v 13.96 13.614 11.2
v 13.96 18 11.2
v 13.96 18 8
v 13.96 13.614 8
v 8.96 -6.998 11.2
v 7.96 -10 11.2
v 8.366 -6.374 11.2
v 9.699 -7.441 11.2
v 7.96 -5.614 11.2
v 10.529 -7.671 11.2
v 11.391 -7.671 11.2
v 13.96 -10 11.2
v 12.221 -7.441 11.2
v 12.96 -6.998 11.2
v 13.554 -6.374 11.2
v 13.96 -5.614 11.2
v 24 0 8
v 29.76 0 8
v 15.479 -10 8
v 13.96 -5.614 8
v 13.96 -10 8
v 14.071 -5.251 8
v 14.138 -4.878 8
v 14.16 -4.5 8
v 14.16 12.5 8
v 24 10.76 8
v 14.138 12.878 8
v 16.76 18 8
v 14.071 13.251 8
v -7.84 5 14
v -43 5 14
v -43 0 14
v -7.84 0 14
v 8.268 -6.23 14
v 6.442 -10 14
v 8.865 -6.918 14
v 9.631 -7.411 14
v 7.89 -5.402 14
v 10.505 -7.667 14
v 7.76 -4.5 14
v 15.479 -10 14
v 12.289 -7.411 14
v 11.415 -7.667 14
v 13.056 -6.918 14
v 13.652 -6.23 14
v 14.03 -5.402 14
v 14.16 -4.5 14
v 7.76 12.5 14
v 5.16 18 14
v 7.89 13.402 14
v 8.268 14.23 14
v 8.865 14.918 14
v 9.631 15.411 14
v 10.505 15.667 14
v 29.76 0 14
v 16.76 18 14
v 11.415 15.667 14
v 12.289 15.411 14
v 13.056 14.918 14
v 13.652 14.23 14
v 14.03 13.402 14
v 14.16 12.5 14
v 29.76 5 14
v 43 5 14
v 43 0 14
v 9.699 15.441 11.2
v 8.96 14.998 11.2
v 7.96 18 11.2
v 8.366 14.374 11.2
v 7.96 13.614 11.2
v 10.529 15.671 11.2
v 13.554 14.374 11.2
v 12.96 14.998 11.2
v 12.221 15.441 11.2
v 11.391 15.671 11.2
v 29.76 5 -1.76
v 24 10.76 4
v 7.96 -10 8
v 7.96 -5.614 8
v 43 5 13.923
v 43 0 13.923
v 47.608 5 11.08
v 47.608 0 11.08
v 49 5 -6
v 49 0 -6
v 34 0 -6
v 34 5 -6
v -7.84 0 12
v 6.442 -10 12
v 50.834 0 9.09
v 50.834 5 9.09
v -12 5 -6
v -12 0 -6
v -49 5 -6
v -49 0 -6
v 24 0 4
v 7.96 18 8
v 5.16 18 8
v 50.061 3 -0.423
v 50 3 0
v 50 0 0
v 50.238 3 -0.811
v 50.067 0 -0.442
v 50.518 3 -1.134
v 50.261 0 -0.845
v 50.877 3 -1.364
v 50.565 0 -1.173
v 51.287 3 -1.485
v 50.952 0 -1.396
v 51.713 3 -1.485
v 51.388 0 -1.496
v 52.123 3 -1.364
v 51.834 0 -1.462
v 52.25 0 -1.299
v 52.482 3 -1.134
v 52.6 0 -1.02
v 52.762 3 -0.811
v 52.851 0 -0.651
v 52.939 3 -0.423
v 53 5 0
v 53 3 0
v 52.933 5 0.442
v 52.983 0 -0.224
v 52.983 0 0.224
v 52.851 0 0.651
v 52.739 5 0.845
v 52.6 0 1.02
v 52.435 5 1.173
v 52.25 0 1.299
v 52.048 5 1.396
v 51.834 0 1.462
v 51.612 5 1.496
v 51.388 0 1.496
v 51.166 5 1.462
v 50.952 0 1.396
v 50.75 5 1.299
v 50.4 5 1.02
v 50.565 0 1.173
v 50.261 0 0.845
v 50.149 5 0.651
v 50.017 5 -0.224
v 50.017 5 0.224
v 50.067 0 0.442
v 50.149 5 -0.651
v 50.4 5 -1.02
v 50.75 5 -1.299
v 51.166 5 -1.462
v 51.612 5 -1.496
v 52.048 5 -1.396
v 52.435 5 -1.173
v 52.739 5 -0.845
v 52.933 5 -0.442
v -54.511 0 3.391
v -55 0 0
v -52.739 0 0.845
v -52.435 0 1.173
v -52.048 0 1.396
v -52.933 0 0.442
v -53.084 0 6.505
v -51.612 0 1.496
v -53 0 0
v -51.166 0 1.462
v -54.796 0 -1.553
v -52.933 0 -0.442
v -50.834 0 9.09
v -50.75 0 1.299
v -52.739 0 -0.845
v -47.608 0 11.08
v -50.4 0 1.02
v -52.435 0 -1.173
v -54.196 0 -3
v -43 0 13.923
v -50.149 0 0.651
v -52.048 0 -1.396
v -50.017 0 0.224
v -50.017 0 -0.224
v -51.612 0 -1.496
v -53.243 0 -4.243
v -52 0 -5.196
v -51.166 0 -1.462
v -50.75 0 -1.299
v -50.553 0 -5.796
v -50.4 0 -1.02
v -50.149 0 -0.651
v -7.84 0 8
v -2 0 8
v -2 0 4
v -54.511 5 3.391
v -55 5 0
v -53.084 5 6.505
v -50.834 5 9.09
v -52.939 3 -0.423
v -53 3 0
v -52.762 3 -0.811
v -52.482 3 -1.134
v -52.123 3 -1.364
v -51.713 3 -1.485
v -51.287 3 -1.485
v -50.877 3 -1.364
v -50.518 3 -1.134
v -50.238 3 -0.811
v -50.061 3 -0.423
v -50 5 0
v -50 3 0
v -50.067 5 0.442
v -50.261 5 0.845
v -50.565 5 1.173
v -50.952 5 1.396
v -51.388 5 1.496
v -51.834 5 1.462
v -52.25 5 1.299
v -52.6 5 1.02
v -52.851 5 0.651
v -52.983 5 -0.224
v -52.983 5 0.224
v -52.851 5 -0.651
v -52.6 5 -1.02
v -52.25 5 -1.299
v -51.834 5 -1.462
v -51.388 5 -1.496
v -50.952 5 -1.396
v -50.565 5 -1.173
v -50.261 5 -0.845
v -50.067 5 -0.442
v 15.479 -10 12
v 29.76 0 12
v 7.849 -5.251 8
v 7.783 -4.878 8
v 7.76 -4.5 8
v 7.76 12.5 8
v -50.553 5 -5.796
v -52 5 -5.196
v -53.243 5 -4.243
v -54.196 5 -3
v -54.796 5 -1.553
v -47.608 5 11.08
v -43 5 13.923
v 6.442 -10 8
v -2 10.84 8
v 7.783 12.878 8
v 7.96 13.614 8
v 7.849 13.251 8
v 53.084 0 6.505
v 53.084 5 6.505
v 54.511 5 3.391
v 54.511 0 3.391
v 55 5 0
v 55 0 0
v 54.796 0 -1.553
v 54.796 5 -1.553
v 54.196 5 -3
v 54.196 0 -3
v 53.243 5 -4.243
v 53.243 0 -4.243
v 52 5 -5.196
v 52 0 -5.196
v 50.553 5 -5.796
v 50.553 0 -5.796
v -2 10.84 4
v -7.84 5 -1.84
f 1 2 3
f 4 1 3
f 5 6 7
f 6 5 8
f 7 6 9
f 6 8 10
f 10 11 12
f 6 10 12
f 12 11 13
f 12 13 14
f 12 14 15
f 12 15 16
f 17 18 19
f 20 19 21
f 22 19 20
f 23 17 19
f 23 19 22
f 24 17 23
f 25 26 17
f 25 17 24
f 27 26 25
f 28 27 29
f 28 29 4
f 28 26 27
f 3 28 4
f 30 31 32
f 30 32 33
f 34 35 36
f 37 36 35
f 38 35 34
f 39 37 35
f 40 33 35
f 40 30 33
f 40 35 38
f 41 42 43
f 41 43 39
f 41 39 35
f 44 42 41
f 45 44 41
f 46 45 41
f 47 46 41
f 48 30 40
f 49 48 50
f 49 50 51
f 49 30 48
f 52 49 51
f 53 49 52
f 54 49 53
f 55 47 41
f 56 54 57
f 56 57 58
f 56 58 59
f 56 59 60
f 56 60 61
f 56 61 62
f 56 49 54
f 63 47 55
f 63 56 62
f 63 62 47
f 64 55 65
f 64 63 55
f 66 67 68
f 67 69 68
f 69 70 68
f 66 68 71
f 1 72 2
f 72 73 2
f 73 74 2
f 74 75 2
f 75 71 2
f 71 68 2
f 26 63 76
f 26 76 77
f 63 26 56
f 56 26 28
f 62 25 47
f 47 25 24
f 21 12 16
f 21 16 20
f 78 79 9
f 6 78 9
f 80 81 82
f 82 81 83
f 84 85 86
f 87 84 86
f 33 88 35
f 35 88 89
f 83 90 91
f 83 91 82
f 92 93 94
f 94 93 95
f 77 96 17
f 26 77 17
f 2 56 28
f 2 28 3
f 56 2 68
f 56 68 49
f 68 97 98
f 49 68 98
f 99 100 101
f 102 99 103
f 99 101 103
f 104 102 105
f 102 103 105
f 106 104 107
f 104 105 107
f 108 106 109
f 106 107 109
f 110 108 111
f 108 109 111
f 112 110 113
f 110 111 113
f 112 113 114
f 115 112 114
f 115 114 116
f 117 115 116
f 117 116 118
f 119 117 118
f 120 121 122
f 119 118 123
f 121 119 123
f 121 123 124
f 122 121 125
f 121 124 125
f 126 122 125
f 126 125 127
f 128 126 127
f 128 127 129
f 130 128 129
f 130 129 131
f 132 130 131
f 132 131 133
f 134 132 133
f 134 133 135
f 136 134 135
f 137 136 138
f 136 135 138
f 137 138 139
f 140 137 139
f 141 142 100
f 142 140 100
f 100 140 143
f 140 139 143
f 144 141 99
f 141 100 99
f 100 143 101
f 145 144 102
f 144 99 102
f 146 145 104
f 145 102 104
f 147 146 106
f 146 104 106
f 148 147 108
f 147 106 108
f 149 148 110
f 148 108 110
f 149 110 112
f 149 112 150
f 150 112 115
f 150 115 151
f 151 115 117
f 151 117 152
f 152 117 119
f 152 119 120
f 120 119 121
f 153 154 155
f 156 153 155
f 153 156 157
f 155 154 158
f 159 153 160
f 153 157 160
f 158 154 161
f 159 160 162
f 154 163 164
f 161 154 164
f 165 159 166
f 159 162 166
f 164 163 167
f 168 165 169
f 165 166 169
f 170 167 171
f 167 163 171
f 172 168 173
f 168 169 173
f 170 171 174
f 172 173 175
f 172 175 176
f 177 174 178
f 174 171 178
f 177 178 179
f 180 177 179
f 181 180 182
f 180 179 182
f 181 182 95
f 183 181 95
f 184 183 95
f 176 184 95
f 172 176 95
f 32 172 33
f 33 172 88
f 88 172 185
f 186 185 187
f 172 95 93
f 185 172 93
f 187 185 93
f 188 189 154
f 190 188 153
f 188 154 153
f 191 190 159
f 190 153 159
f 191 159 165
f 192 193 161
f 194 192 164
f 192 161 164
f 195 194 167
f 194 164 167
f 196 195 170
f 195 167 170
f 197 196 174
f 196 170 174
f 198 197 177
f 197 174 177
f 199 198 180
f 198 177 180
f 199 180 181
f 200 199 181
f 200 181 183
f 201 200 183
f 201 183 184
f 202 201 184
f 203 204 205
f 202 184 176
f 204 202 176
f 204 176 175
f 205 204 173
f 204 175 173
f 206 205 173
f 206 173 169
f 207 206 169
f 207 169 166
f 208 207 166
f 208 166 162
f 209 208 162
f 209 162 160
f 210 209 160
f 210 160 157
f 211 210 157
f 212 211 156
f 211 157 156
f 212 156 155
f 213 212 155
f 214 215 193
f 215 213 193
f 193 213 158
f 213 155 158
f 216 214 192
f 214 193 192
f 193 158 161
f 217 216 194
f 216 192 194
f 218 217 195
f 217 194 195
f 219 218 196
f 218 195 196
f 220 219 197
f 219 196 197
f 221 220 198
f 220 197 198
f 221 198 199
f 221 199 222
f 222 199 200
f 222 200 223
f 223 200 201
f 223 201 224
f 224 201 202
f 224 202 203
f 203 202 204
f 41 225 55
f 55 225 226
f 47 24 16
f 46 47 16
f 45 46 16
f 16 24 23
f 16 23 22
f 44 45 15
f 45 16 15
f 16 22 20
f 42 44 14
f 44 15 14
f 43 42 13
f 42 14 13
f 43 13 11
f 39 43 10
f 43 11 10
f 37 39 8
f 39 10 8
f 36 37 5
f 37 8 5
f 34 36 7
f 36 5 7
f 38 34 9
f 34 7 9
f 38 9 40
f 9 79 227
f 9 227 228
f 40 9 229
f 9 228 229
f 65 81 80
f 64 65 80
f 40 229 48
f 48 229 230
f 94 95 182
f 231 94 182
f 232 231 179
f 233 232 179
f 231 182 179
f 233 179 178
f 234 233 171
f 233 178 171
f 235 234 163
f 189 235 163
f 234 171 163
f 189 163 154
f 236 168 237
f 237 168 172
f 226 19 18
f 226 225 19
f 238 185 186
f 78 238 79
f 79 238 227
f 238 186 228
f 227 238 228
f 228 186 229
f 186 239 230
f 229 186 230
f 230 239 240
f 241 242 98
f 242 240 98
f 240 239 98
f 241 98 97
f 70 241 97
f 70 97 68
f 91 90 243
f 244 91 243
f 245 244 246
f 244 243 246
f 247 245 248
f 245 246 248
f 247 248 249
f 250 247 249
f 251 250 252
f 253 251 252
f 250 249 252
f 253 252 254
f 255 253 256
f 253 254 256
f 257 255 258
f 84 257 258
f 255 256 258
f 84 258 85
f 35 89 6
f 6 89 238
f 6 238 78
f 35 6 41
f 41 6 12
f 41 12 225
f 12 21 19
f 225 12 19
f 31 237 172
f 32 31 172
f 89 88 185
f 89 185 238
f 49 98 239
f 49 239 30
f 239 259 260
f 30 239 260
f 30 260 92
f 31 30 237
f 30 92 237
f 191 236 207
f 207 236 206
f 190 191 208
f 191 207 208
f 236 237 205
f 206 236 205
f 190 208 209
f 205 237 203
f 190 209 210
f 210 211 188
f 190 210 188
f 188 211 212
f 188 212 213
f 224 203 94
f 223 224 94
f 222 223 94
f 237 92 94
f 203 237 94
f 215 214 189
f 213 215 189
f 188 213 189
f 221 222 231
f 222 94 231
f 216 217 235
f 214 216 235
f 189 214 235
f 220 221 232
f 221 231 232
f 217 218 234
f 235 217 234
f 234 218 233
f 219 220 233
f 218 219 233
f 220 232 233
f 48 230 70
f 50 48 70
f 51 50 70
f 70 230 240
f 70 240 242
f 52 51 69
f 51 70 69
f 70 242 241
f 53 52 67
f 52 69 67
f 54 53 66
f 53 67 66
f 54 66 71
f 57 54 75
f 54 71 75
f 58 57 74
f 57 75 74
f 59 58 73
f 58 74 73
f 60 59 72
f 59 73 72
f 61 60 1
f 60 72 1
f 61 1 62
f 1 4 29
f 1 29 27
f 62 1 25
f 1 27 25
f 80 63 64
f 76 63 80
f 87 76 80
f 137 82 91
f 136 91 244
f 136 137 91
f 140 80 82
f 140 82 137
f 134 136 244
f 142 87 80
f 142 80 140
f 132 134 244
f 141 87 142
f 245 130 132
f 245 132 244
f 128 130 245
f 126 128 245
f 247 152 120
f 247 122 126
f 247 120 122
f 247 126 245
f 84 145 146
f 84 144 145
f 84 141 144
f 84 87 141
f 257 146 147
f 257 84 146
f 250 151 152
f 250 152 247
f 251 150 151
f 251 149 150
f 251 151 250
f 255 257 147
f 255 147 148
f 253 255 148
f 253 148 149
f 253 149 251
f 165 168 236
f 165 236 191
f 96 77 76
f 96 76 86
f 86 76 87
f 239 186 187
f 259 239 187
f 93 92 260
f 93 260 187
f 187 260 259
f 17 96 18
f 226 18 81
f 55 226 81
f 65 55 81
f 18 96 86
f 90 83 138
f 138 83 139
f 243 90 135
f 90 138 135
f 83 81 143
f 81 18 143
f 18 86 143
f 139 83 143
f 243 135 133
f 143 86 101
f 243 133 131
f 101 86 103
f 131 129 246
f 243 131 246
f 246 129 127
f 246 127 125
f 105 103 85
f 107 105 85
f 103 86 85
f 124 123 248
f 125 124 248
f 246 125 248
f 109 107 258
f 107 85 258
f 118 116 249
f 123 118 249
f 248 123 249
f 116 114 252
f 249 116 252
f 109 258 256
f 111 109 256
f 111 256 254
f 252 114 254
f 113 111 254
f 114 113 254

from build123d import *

# Parameters (mm, degrees)
BOSS_EXTRUDE1_DEPTH = 3
CUT_EXTRUDE1_DEPTH  = 10
CUT_EXTRUDE3_START  = 8
SKETCH8_W           = 6
SKETCH8_H           = 3
CUT_EXTRUDE3_DEPTH  = 6
BOSS_EXTRUDE4_START = 18
BOSS_EXTRUDE4_DEPTH = 28
BOSS_EXTRUDE5_DEPTH = 3
CUT_EXTRUDE4_DEPTH  = 3
CUT_EXTRUDE5_DEPTH  = 10
SKETCH18_R          = 1.5
BOSS_EXTRUDE9_DEPTH = 2
CHAMFER1_SIZE       = 15
CHAMFER2_SIZE       = 15
CHAMFER2_SIZE_2     = 10.503113073
CUT_EXTRUDE6_DEPTH  = 5
BOSS_EXTRUDE8_DEPTH = 2
CHAMFER3_DEPTH      = 6
CHAMFER3_2_DEPTH    = 5


with BuildPart() as part:
    # Sketch1 → Boss-Extrude1 (new body)
    with BuildSketch(Plane(origin=(0, 0, 0), x_dir=(1, 0, 0), z_dir=(0, 1, 0))):
        with BuildLine():
            ThreePointArc((-49, -6), (-53.242640687, -4.242640687), (-55, 0))
            ThreePointArc((-55, 0), (-51.485281374, -8.485281374), (-43, -12))
            Line((-43, -12), (43, -12))
            ThreePointArc((43, -12), (51.485281374, -8.485281374), (55, 0))
            ThreePointArc((55, 0), (53.242640687, -4.242640687), (49, -6))
            Line((49, -6), (-49, -6))
        make_face()
        with BuildLine():
            Line((-53, 0), (-55, 0))
            ThreePointArc((-55, 0), (-53.242640687, -4.242640687), (-49, -6))
            Line((-49, -6), (49, -6))
            ThreePointArc((49, -6), (53.242640687, -4.242640687), (55, 0))
            Line((55, 0), (53, 0))
            ThreePointArc((53, 0), (51.5, -1.5), (50, 0))
            Line((50, 0), (-50, 0))
            ThreePointArc((-50, 0), (-51.5, -1.5), (-53, 0))
        make_face()
        with BuildLine():
            Line((49, 6), (-49, 6))
            ThreePointArc((-49, 6), (-53.242640687, 4.242640687), (-55, 0))
            Line((-55, 0), (-53, 0))
            ThreePointArc((-53, 0), (-51.5, 1.5), (-50, 0))
            Line((-50, 0), (50, 0))
            ThreePointArc((50, 0), (51.5, 1.5), (53, 0))
            Line((53, 0), (55, 0))
            ThreePointArc((55, 0), (53.242640687, 4.242640687), (49, 6))
        make_face()
    extrude(amount=BOSS_EXTRUDE1_DEPTH)

    # Sketch2 → Cut-Extrude1 (cut)
    with BuildSketch(Plane(origin=(0, 3, 0), x_dir=(1, 0, 0), z_dir=(0, 1, 0))):
        Polygon((22, -8), (36, 6), (-14, 6), (0, -8), align=None)
    extrude(amount=-CUT_EXTRUDE1_DEPTH, mode=Mode.SUBTRACT)

    # Sketch8 → Cut-Extrude3 (cut)
    with BuildSketch(Plane.XY.offset(CUT_EXTRUDE3_START)):
        with Locations((10.960071178, 1.5)):
            Rectangle(SKETCH8_W, SKETCH8_H)
    extrude(amount=CUT_EXTRUDE3_DEPTH, mode=Mode.SUBTRACT)


with BuildPart() as cut_extrude3_piece_1:
    # of the separate pieces the step leaves, piece 1, a body of its own (cut_extrude3_pieces)
    add(part.part.solids().sort_by_distance((-55, 0, 0))[0])

    # Sketch9 → Boss-Extrude4 (add)
    with BuildSketch(Plane(origin=(0, 0, 0), x_dir=(1, 0, 0), z_dir=(0, 1, 0)).offset(BOSS_EXTRUDE4_START)):
        Polygon((13.960071178, -11.2), (13.960071178, -8), (14.760071178, -8), (14.760071178, -12), (7.160071178, -12), (7.160071178, -8), (7.960071178, -8), (7.960071178, -11.2), align=None)
    extrude(amount=-BOSS_EXTRUDE4_DEPTH)


with BuildPart() as cut_extrude3_piece_2:
    # of the separate pieces the step leaves, piece 2, a body of its own (cut_extrude3_pieces)
    add(part.part.solids().sort_by_distance((13.960071178, 0, 12))[0])


with BuildPart() as cut_extrude3_piece_1_1:
    add(cut_extrude3_piece_1.part)

    # Combine1: union Cut-Extrude3 piece 2
    add(cut_extrude3_piece_2.part)

    # Sketch11 → Boss-Extrude5 (add)
    with BuildSketch(Plane(origin=(0, 3, 0), x_dir=(1, 0, 0), z_dir=(0, 1, 0))):
        Polygon((-14, 6), (-12, 6), (2, -8), (0, -8), align=None)
        Polygon((20, -8), (34, 6), (36, 6), (22, -8), align=None)
    extrude(amount=-BOSS_EXTRUDE5_DEPTH)

    # Sketch13 → Cut-Extrude4 (cut)
    with BuildSketch(Plane(origin=(0, 3, 0), x_dir=(1, 0, 0), z_dir=(0, 1, 0))):
        Polygon((2, -8), (-2, -8), (-2, -4), align=None)
        Polygon((24, -4), (24, -8), (20, -8), align=None)
    extrude(amount=-CUT_EXTRUDE4_DEPTH, mode=Mode.SUBTRACT)

    # Sketch15 → Cut-Extrude5 (cut)
    with BuildSketch(Plane.XY.offset(12)):
        with BuildLine():
            Line((14.160071178, 12.5), (14.160071178, -4.5))
            ThreePointArc((14.160071178, -4.5), (10.960071178, -7.7), (7.760071178, -4.5))
            Line((7.760071178, -4.5), (7.760071178, 12.5))
            ThreePointArc((7.760071178, 12.5), (10.960071178, 15.7), (14.160071178, 12.5))
        make_face()
    extrude(amount=-CUT_EXTRUDE5_DEPTH, mode=Mode.SUBTRACT)

    # Sketch18 → Boss-Extrude9 (add)
    # profile 1 of 2: a face of its own
    with BuildSketch(Plane(origin=(0, 3, 0), x_dir=(1, 0, 0), z_dir=(0, 1, 0))):
        with BuildLine():
            Line((7.160071178, -12), (7.160071178, -8))
            Line((7.160071178, -8), (-2, -8))
            Line((-2, -8), (-2, -4))
            Line((-2, -4), (-12, 6))
            Line((-12, 6), (-49, 6))
            ThreePointArc((-49, 6), (-53.242640687, 4.242640687), (-55, 0))
            ThreePointArc((-55, 0), (-51.485281374, -8.485281374), (-43, -12))
            Line((-43, -12), (7.160071178, -12))
        make_face()
        with Locations((-51.5, 0)):
            Circle(SKETCH18_R, mode=Mode.SUBTRACT)
    # profile 2 of 2: a face of its own
    with BuildSketch(Plane(origin=(0, 3, 0), x_dir=(1, 0, 0), z_dir=(0, 1, 0))):
        with BuildLine():
            Line((34, 6), (24, -4))
            Line((24, -4), (24, -8))
            Line((24, -8), (14.760071178, -8))
            Line((14.760071178, -8), (14.760071178, -12))
            Line((14.760071178, -12), (43, -12))
            ThreePointArc((43, -12), (51.485281374, -8.485281374), (55, 0))
            ThreePointArc((55, 0), (53.242640687, 4.242640687), (49, 6))
            Line((49, 6), (34, 6))
        make_face()
        with Locations((51.5, 0)):
            Circle(SKETCH18_R, mode=Mode.SUBTRACT)
    extrude(amount=BOSS_EXTRUDE9_DEPTH)

    # Chamfer1
    # the kernel refuses this chamfer: 15 mm, written as the material it adds along each edge
    with BuildSketch(Plane(origin=(14.760071178, 5, 8), x_dir=(0, 1, 0), z_dir=(0, 0, 1))) as chamfer1_piece_1_section:
        Polygon((CHAMFER1_SIZE, 0), (0, -CHAMFER1_SIZE), (0, 0), align=None)
    chamfer1_piece_1 = extrude(amount=4, mode=Mode.PRIVATE)
    chamfer1_piece_1 = split(chamfer1_piece_1, bisect_by=Plane(origin=(14.760071178, 18, 8), z_dir=(0, -1, 0)), keep=Keep.TOP, mode=Mode.PRIVATE)
    chamfer1_piece_1 = split(chamfer1_piece_1, bisect_by=Plane(origin=(17.380035589, 5, 10.619964411), z_dir=(-0.7071067811865474, 0, -0.7071067811865477)), keep=Keep.TOP, mode=Mode.PRIVATE)
    add(chamfer1_piece_1)
    with BuildSketch(Plane(origin=(14.760071178, 5, -30.575244819), x_dir=(0, 1, 0), z_dir=(0, 0, 1))) as chamfer1_piece_2_section:
        Polygon((CHAMFER1_SIZE, 0), (0, -CHAMFER1_SIZE), (0, 0), align=None)
    chamfer1_piece_2 = extrude(amount=42.575244819, mode=Mode.PRIVATE)
    chamfer1_piece_2 = split(chamfer1_piece_2, bisect_by=Plane(origin=(14.760071178, 5, 8), z_dir=(0, 0, -1)), keep=Keep.TOP, mode=Mode.PRIVATE)
    chamfer1_piece_2 = split(chamfer1_piece_2, bisect_by=Plane(origin=(36.667657999, 5, -8.667657999), z_dir=(0.7071067811865474, 0, 0.7071067811865477)), keep=Keep.TOP, mode=Mode.PRIVATE)
    chamfer1_piece_2 = split(chamfer1_piece_2, bisect_by=Plane(origin=(24, 5, -30.575244819), z_dir=(1, 0, 0)), keep=Keep.TOP, mode=Mode.PRIVATE)
    add(chamfer1_piece_2)
    with BuildSketch(Plane(origin=(14.760071178, 5, 8), x_dir=(0, 1, 0), z_dir=(0, 0, 1))) as chamfer1_piece_3_section:
        Polygon((CHAMFER1_SIZE, 0), (0, -CHAMFER1_SIZE), (0, 0), align=None)
    chamfer1_piece_3 = extrude(amount=4, mode=Mode.PRIVATE)
    chamfer1_piece_3 = split(chamfer1_piece_3, bisect_by=Plane(origin=(14.760071178, 18, 8), z_dir=(0, -1, 0)), keep=Keep.TOP, mode=Mode.PRIVATE)
    chamfer1_piece_3 = split(chamfer1_piece_3, bisect_by=Plane(origin=(17.380035589, 5, 10.619964411), z_dir=(0.7071067811865474, 0, 0.7071067811865477)), keep=Keep.TOP, mode=Mode.PRIVATE)
    chamfer1_piece_3 = split(chamfer1_piece_3, bisect_by=Plane(origin=(24, 5, 8), z_dir=(-1, 0, 0)), keep=Keep.TOP, mode=Mode.PRIVATE)
    add(chamfer1_piece_3)
    with BuildSketch(Plane(origin=(14.760071178, 5, 8), x_dir=(0, 1, 0), z_dir=(0, 0, 1))) as chamfer1_piece_4_section:
        Polygon((CHAMFER1_SIZE, 0), (0, -CHAMFER1_SIZE), (0, 0), align=None)
    chamfer1_piece_4 = extrude(amount=4, mode=Mode.PRIVATE)
    chamfer1_piece_4 = split(chamfer1_piece_4, bisect_by=Plane(origin=(24, 5, 8), z_dir=(1, 0, 0)), keep=Keep.TOP, mode=Mode.PRIVATE)
    add(chamfer1_piece_4)
    with BuildSketch(Plane(origin=(7.160071178, 5, 12), x_dir=(0, 1, 0), z_dir=(0, 0, -1))) as chamfer1_piece_5_section:
        Polygon((CHAMFER1_SIZE, 0), (0, -CHAMFER1_SIZE), (0, 0), align=None)
    chamfer1_piece_5 = extrude(amount=4, mode=Mode.PRIVATE)
    chamfer1_piece_5 = split(chamfer1_piece_5, bisect_by=Plane(origin=(6.580035589, 5, 12.580035589), z_dir=(-0.7071067811865489, 0, 0.7071067811865461)), keep=Keep.TOP, mode=Mode.PRIVATE)
    chamfer1_piece_5 = split(chamfer1_piece_5, bisect_by=Plane(origin=(-2, 5, 12), z_dir=(1, 0, 0)), keep=Keep.TOP, mode=Mode.PRIVATE)
    chamfer1_piece_5 = split(chamfer1_piece_5, bisect_by=Plane(origin=(7.160071178, 18, 12), z_dir=(0, -1, 0)), keep=Keep.TOP, mode=Mode.PRIVATE)
    add(chamfer1_piece_5)
    with BuildSketch(Plane(origin=(7.160071178, 5, 12), x_dir=(0, 1, 0), z_dir=(0, 0, -1))) as chamfer1_piece_6_section:
        Polygon((CHAMFER1_SIZE, 0), (0, -CHAMFER1_SIZE), (0, 0), align=None)
    chamfer1_piece_6 = extrude(amount=4, mode=Mode.PRIVATE)
    chamfer1_piece_6 = split(chamfer1_piece_6, bisect_by=Plane(origin=(-2, 5, 12), z_dir=(-1, 0, 0)), keep=Keep.TOP, mode=Mode.PRIVATE)
    add(chamfer1_piece_6)
    with BuildSketch(Plane(origin=(7.160071178, 5, 12), x_dir=(0, 1, 0), z_dir=(0, 0, -1))) as chamfer1_piece_7_section:
        Polygon((CHAMFER1_SIZE, 0), (0, -CHAMFER1_SIZE), (0, 0), align=None)
    chamfer1_piece_7 = extrude(amount=4, mode=Mode.PRIVATE)
    chamfer1_piece_7 = split(chamfer1_piece_7, bisect_by=Plane(origin=(6.580035589, 5, 12.580035589), z_dir=(0.7071067811865489, 0, -0.7071067811865461)), keep=Keep.TOP, mode=Mode.PRIVATE)
    chamfer1_piece_7 = split(chamfer1_piece_7, bisect_by=Plane(origin=(7.160071178, 18, 12), z_dir=(0, -1, 0)), keep=Keep.TOP, mode=Mode.PRIVATE)
    add(chamfer1_piece_7)
    with BuildSketch(Plane(origin=(7.160071178, 5, 12), x_dir=(0, 1, 0), z_dir=(0, 0, -1))) as chamfer1_piece_8_section:
        Polygon((CHAMFER1_SIZE, 0), (0, -CHAMFER1_SIZE), (0, 0), align=None)
    chamfer1_piece_8 = extrude(amount=42.575244819, mode=Mode.PRIVATE)
    chamfer1_piece_8 = split(chamfer1_piece_8, bisect_by=Plane(origin=(6.580035589, 5, 12.580035589), z_dir=(-0.7071067811865489, 0, 0.7071067811865461)), keep=Keep.TOP, mode=Mode.PRIVATE)
    chamfer1_piece_8 = split(chamfer1_piece_8, bisect_by=Plane(origin=(-2, 5, 12), z_dir=(-1, 0, 0)), keep=Keep.TOP, mode=Mode.PRIVATE)
    chamfer1_piece_8 = split(chamfer1_piece_8, bisect_by=Plane(origin=(7.160071178, 5, 8), z_dir=(0, 0, -1)), keep=Keep.TOP, mode=Mode.PRIVATE)
    add(chamfer1_piece_8)

    # Chamfer2
    # the kernel refuses this chamfer: 15, 10.503113073 mm, written as the material it adds along each edge
    with BuildSketch(Plane(origin=(7.160071178, 0, 12), x_dir=(-1, 0, 0), z_dir=(0, 0, -1))) as chamfer2_piece_1_section:
        Polygon((CHAMFER2_SIZE, 0), (0, -CHAMFER2_SIZE_2), (0, 0), align=None)
    chamfer2_piece_1 = extrude(amount=4, mode=Mode.PRIVATE)
    chamfer2_piece_1 = split(chamfer2_piece_1, bisect_by=Plane(origin=(-2, 0, 12), z_dir=(-1, 0, 0)), keep=Keep.TOP, mode=Mode.PRIVATE)
    add(chamfer2_piece_1)
    with BuildSketch(Plane(origin=(7.160071178, 0, 12), x_dir=(-1, 0, 0), z_dir=(0, 0, -1))) as chamfer2_piece_2_section:
        Polygon((CHAMFER2_SIZE, 0), (0, -CHAMFER2_SIZE_2), (0, 0), align=None)
    chamfer2_piece_2 = extrude(amount=4, mode=Mode.PRIVATE)
    chamfer2_piece_2 = split(chamfer2_piece_2, bisect_by=Plane(origin=(6.580035589, 0, 12.580035589), z_dir=(-0.7071067811865476, 0, 0.7071067811865476)), keep=Keep.TOP, mode=Mode.PRIVATE)
    chamfer2_piece_2 = split(chamfer2_piece_2, bisect_by=Plane(origin=(-2, 0, 12), z_dir=(1, 0, 0)), keep=Keep.TOP, mode=Mode.PRIVATE)
    add(chamfer2_piece_2)
    with BuildSketch(Plane(origin=(7.160071178, 0, 12), x_dir=(-1, 0, 0), z_dir=(0, 0, -1))) as chamfer2_piece_3_section:
        Polygon((CHAMFER2_SIZE, 0), (0, -CHAMFER2_SIZE_2), (0, 0), align=None)
    chamfer2_piece_3 = extrude(amount=42.738283454, mode=Mode.PRIVATE)
    chamfer2_piece_3 = split(chamfer2_piece_3, bisect_by=Plane(origin=(6.580035589, 0, 12.580035589), z_dir=(-0.7071067811865476, 0, 0.7071067811865476)), keep=Keep.TOP, mode=Mode.PRIVATE)
    chamfer2_piece_3 = split(chamfer2_piece_3, bisect_by=Plane(origin=(7.160071178, 0, 8), z_dir=(0, 0, -1)), keep=Keep.TOP, mode=Mode.PRIVATE)
    chamfer2_piece_3 = split(chamfer2_piece_3, bisect_by=Plane(origin=(-2, 0, 12), z_dir=(-1, 0, 0)), keep=Keep.TOP, mode=Mode.PRIVATE)
    add(chamfer2_piece_3)
    with BuildSketch(Plane(origin=(7.160071178, 0, 12), x_dir=(-1, 0, 0), z_dir=(0, 0, -1))) as chamfer2_piece_4_section:
        Polygon((CHAMFER2_SIZE, 0), (0, -CHAMFER2_SIZE_2), (0, 0), align=None)
    chamfer2_piece_4 = extrude(amount=4, mode=Mode.PRIVATE)
    chamfer2_piece_4 = split(chamfer2_piece_4, bisect_by=Plane(origin=(6.580035589, 0, 12.580035589), z_dir=(0.7071067811865476, 0, -0.7071067811865476)), keep=Keep.TOP, mode=Mode.PRIVATE)
    chamfer2_piece_4 = split(chamfer2_piece_4, bisect_by=Plane(origin=(7.160071178, -10, 12), z_dir=(0, 1, 0)), keep=Keep.TOP, mode=Mode.PRIVATE)
    add(chamfer2_piece_4)
    with BuildSketch(Plane(origin=(14.760071178, 0, 12), x_dir=(0, -1, 0), z_dir=(0, 0, -1))) as chamfer2_piece_5_section:
        Polygon((CHAMFER2_SIZE_2, 0), (0, -CHAMFER2_SIZE), (0, 0), align=None)
    chamfer2_piece_5 = extrude(amount=4, mode=Mode.PRIVATE)
    chamfer2_piece_5 = split(chamfer2_piece_5, bisect_by=Plane(origin=(15.380035589, 0, 12.619964411), z_dir=(0.7071067811865476, 0, 0.7071067811865476)), keep=Keep.TOP, mode=Mode.PRIVATE)
    chamfer2_piece_5 = split(chamfer2_piece_5, bisect_by=Plane(origin=(24, 0, 12), z_dir=(-1, 0, 0)), keep=Keep.TOP, mode=Mode.PRIVATE)
    add(chamfer2_piece_5)
    with BuildSketch(Plane(origin=(14.760071178, 0, 12), x_dir=(0, -1, 0), z_dir=(0, 0, -1))) as chamfer2_piece_6_section:
        Polygon((CHAMFER2_SIZE_2, 0), (0, -CHAMFER2_SIZE), (0, 0), align=None)
    chamfer2_piece_6 = extrude(amount=4, mode=Mode.PRIVATE)
    chamfer2_piece_6 = split(chamfer2_piece_6, bisect_by=Plane(origin=(24, 0, 12), z_dir=(1, 0, 0)), keep=Keep.TOP, mode=Mode.PRIVATE)
    add(chamfer2_piece_6)
    with BuildSketch(Plane(origin=(14.760071178, 0, 12), x_dir=(0, -1, 0), z_dir=(0, 0, -1))) as chamfer2_piece_7_section:
        Polygon((CHAMFER2_SIZE_2, 0), (0, -CHAMFER2_SIZE), (0, 0), align=None)
    chamfer2_piece_7 = extrude(amount=4, mode=Mode.PRIVATE)
    chamfer2_piece_7 = split(chamfer2_piece_7, bisect_by=Plane(origin=(14.760071178, -10, 12), z_dir=(0, 1, 0)), keep=Keep.TOP, mode=Mode.PRIVATE)
    chamfer2_piece_7 = split(chamfer2_piece_7, bisect_by=Plane(origin=(15.380035589, 0, 12.619964411), z_dir=(-0.7071067811865476, 0, -0.7071067811865476)), keep=Keep.TOP, mode=Mode.PRIVATE)
    add(chamfer2_piece_7)
    with BuildSketch(Plane(origin=(14.760071178, 0, 12), x_dir=(0, -1, 0), z_dir=(0, 0, -1))) as chamfer2_piece_8_section:
        Polygon((CHAMFER2_SIZE_2, 0), (0, -CHAMFER2_SIZE), (0, 0), align=None)
    chamfer2_piece_8 = extrude(amount=42.738283454, mode=Mode.PRIVATE)
    chamfer2_piece_8 = split(chamfer2_piece_8, bisect_by=Plane(origin=(14.760071178, 0, 8), z_dir=(0, 0, -1)), keep=Keep.TOP, mode=Mode.PRIVATE)
    chamfer2_piece_8 = split(chamfer2_piece_8, bisect_by=Plane(origin=(15.380035589, 0, 12.619964411), z_dir=(0.7071067811865476, 0, 0.7071067811865476)), keep=Keep.TOP, mode=Mode.PRIVATE)
    chamfer2_piece_8 = split(chamfer2_piece_8, bisect_by=Plane(origin=(24, 0, 12), z_dir=(1, 0, 0)), keep=Keep.TOP, mode=Mode.PRIVATE)
    add(chamfer2_piece_8)

    # Sketch16 → Cut-Extrude6 (cut)
    with BuildSketch(Plane(origin=(0, 0, 0), x_dir=(1, 0, 0), z_dir=(0, 1, 0))):
        Polygon((-7.839928822, 1.839928822), (-2, -4), (-2, -8), (-7.839928822, -8), align=None)
        Polygon((24, -8), (24, -4), (29.760071178, 1.760071178), (29.760071178, -8), align=None)
    extrude(amount=-CUT_EXTRUDE6_DEPTH, mode=Mode.SUBTRACT)

    # Sketch17 → Boss-Extrude8 (add)
    with BuildSketch(Plane.XY.offset(12)):
        Polygon((-7.839928822, 0), (6.441551245, -10), (15.47859111, -10), (29.760071178, 0), (43, 0), (43, 5), (29.760071178, 5), (16.760071178, 18), (5.160071178, 18), (-7.839928822, 5), (-43, 5), (-43, 0), align=None)
        with BuildLine():
            Line((7.760071178, -4.5), (7.760071178, 12.5))
            ThreePointArc((7.760071178, 12.5), (10.960071178, 15.7), (14.160071178, 12.5))
            Line((14.160071178, 12.5), (14.160071178, -4.5))
            ThreePointArc((14.160071178, -4.5), (10.960071178, -7.7), (7.760071178, -4.5))
        make_face(mode=Mode.SUBTRACT)
    extrude(amount=BOSS_EXTRUDE8_DEPTH)

    # Chamfer3: read off the stored shape, not the designer's step
    # Chamfer3 outline → Chamfer3 (cut)
    with BuildSketch(Plane(origin=(0, 0, 0), x_dir=(1, 0, 0), z_dir=(0, 1, 0))):
        with BuildLine():
            ThreePointArc((47.608318931, -11.079864468), (49.300429772, -10.212961602), (50.834384089, -9.08968789))
            Line((50.834384089, -9.08968789), (47.608318931, -11.079864468))
        make_face()
        with BuildLine():
            ThreePointArc((-50.834384089, -9.08968789), (-49.300429772, -10.212961602), (-47.608318931, -11.079864468))
            Line((-47.608318931, -11.079864468), (-50.834384089, -9.08968789))
        make_face()
    extrude(amount=CHAMFER3_DEPTH, mode=Mode.SUBTRACT)

    # Chamfer3 2 outline → Chamfer3 2 (add)
    with BuildSketch(Plane(origin=(0, 0, 0), x_dir=(1, 0, 0), z_dir=(0, 1, 0))):
        with BuildLine():
            Line((43, -13.922760673), (47.608318931, -11.079864468))
            ThreePointArc((47.608318931, -11.079864468), (45.349641077, -11.767717995), (43, -12))
            Line((43, -12), (43, -13.922760673))
        make_face()
        with BuildLine():
            Line((-47.608318931, -11.079864468), (-43, -13.922760673))
            Line((-43, -13.922760673), (-43, -12))
            ThreePointArc((-43, -12), (-45.349641077, -11.767717995), (-47.608318931, -11.079864468))
        make_face()
    extrude(amount=CHAMFER3_2_DEPTH)


solid = cut_extrude3_piece_1_1.part
